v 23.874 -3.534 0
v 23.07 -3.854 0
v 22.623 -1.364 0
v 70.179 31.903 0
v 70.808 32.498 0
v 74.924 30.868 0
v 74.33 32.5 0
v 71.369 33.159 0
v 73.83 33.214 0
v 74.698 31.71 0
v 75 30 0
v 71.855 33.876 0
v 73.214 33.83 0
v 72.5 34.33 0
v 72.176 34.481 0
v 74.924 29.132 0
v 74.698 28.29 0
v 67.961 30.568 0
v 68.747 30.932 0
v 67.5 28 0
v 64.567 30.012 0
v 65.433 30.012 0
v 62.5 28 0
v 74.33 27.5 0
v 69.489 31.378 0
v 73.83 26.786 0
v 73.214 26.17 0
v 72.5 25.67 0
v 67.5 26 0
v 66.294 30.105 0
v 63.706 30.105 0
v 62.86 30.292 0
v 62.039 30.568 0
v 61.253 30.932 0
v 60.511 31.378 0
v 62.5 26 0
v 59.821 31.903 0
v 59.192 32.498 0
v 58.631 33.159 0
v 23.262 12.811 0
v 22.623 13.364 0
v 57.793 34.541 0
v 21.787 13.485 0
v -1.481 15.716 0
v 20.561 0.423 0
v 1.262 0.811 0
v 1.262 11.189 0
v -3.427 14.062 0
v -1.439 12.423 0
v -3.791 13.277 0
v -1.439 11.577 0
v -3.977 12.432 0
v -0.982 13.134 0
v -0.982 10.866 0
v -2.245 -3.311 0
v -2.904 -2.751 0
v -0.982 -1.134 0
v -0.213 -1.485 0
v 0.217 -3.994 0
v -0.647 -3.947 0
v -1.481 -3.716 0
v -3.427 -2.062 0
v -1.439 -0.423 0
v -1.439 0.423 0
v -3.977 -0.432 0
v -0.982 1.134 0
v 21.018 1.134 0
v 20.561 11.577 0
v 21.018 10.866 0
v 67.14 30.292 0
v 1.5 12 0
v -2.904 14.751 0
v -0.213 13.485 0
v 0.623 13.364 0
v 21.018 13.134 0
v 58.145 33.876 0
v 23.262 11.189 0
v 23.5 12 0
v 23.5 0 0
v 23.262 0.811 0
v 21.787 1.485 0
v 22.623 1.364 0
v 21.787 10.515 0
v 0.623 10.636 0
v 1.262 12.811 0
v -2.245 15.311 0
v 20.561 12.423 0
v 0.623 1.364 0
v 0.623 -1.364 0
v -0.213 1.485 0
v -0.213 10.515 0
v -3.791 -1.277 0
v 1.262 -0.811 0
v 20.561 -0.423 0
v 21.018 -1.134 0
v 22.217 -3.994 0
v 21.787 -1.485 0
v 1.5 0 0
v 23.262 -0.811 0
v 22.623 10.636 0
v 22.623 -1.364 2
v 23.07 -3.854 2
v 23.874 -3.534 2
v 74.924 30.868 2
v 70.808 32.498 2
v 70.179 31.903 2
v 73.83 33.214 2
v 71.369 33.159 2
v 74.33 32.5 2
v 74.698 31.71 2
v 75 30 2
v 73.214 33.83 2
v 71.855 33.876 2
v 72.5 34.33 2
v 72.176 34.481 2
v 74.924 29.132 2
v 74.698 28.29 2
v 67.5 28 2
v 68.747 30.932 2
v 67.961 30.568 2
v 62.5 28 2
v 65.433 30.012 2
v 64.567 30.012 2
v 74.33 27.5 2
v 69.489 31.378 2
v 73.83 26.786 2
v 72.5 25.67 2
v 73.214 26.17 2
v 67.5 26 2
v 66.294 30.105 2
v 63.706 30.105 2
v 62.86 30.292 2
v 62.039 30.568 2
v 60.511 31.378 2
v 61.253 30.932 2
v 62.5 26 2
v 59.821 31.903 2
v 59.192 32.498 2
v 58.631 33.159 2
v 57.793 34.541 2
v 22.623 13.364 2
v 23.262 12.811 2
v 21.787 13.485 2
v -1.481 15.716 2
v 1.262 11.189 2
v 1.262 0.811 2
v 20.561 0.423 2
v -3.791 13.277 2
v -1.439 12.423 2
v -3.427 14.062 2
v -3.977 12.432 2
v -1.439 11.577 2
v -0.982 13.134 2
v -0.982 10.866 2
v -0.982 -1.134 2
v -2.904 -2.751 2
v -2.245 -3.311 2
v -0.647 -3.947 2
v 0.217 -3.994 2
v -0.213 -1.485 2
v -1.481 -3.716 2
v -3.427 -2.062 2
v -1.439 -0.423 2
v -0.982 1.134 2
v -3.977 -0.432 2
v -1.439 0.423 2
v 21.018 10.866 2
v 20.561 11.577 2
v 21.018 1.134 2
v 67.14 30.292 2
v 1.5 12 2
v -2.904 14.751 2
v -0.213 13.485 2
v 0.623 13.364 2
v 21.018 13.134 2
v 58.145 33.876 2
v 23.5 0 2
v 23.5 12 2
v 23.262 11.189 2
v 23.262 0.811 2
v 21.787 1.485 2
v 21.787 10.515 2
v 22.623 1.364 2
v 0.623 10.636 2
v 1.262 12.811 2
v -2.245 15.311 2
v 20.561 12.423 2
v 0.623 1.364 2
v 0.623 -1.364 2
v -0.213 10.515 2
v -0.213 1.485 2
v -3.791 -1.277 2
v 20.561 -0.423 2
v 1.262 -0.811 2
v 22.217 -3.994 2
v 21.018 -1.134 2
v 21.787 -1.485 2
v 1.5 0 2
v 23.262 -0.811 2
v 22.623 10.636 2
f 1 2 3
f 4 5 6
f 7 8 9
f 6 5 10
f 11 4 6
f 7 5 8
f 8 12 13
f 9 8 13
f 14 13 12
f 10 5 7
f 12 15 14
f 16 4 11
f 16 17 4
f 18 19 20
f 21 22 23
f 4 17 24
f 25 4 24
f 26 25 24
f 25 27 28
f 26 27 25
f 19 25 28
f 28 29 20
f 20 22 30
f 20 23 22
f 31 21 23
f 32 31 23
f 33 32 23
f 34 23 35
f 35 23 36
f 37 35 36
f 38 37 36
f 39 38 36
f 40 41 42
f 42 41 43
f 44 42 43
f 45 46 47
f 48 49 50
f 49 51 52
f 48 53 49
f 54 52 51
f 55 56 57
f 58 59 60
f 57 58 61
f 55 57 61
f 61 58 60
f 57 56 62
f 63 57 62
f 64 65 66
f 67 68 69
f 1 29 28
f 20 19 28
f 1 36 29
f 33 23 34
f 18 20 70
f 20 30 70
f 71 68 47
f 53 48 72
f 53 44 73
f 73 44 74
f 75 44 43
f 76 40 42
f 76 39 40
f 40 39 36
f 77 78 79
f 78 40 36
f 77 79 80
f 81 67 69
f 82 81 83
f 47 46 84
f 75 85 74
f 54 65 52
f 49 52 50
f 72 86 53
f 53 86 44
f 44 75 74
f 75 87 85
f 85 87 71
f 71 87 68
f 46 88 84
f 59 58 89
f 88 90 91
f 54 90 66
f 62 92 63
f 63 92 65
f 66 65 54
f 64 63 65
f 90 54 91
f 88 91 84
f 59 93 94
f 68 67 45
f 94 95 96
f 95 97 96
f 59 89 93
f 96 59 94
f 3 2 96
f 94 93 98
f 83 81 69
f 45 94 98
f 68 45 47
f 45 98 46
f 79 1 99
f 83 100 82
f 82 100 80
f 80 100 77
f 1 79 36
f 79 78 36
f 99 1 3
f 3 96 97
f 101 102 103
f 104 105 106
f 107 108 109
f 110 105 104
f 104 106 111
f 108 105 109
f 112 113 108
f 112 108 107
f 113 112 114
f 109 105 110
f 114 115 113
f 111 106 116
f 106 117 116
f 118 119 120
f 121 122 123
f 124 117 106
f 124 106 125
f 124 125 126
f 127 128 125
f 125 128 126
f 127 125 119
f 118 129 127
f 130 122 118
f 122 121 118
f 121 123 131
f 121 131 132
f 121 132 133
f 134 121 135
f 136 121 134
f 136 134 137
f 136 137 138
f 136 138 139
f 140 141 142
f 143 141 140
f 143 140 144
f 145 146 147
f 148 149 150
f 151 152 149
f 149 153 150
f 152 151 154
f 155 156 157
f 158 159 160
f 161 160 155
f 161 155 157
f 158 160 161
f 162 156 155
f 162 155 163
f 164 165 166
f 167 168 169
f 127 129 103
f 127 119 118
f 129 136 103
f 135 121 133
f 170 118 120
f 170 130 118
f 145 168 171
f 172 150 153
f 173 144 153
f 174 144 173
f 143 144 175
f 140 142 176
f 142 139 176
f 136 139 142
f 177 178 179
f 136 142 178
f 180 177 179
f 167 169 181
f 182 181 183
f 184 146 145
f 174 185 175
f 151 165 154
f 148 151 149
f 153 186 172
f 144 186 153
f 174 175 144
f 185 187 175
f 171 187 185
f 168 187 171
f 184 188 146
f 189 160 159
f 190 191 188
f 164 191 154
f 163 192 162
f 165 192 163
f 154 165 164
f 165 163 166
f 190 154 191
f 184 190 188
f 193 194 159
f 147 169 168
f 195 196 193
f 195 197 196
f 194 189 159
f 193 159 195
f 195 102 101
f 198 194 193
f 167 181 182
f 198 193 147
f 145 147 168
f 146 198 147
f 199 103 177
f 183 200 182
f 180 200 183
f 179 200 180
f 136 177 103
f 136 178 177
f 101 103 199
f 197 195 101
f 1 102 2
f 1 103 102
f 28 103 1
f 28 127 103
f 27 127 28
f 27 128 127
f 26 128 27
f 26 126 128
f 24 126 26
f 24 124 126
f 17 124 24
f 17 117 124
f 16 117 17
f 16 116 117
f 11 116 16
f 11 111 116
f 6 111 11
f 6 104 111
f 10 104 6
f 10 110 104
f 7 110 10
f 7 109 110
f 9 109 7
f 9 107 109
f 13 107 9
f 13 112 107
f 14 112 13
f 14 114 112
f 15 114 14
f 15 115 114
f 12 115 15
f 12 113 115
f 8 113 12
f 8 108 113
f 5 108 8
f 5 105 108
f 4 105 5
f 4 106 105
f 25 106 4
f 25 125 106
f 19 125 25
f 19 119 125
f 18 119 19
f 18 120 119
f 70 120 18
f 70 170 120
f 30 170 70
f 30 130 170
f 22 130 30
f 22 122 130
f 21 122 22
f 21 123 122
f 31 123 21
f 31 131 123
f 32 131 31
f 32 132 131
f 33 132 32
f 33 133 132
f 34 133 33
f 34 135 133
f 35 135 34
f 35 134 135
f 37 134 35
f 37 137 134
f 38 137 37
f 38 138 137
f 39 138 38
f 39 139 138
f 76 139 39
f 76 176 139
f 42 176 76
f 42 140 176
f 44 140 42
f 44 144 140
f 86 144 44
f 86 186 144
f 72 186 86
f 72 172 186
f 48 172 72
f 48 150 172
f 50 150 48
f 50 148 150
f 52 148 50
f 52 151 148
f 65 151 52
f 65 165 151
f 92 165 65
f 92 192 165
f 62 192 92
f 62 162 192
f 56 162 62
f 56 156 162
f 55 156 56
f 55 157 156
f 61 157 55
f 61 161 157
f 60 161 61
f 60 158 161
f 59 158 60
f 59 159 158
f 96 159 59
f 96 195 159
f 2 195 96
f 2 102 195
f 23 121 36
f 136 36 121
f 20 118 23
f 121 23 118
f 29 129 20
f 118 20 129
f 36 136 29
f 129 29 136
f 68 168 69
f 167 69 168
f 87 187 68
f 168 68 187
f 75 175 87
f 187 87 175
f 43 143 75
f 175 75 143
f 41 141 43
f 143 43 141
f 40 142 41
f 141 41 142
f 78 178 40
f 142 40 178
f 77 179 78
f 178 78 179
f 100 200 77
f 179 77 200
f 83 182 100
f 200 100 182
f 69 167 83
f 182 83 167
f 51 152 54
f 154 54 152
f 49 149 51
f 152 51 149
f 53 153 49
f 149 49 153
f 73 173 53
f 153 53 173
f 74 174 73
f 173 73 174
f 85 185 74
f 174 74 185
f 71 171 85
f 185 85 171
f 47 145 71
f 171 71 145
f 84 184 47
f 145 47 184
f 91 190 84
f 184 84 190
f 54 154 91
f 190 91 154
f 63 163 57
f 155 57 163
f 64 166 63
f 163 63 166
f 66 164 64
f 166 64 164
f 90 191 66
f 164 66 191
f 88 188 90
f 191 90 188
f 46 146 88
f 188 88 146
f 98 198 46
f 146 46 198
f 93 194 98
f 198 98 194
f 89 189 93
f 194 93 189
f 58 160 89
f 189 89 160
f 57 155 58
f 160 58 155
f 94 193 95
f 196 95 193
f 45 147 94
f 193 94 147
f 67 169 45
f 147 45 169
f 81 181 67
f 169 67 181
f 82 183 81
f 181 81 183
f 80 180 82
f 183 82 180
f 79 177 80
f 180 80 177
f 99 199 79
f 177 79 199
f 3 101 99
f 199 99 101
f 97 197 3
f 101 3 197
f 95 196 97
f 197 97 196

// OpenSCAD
$fa = 1;
$fs = 1.75 / 2;

border_radius = 4;

mount_depth = 30;
mount_height = 20;

holder_depth = 20;
holder_height = 10;

holder_distance = 30;
holder_elevation = 10;

branch_holder_radius = 8;
screw_hole_radius = 1.5;

linear_extrude(height = 2)
difference() {
    hull() {
        hull() {
            translate([0, 0])
            circle(r = border_radius);

            translate([mount_depth - border_radius * 2, 0])
            circle(r = border_radius);

            translate([mount_depth - border_radius * 2, mount_height - border_radius * 2])
            circle(r = border_radius);

            translate([0, mount_height - border_radius * 2])
            circle(r = border_radius);
        }

        translate([mount_depth + holder_distance, mount_height + holder_elevation])
        hull() {
            translate([0, 0])
            circle(r = holder_height / 2);

            translate([holder_depth - holder_height, 0])
            circle(r = holder_height / 2);
        }
    }

    circle(r = screw_hole_radius);

    translate([mount_depth - border_radius * 2, 0])
    circle(r = screw_hole_radius);

    translate([mount_depth - border_radius * 2, mount_height - border_radius * 2])
    circle(r = screw_hole_radius);

    translate([0, mount_height - border_radius * 2])
    circle(r = screw_hole_radius);

    translate([
        mount_depth + holder_distance + holder_depth / 2 - holder_height / 2,
        mount_height + holder_elevation + branch_holder_radius
    ])
    union() {
        circle(r = branch_holder_radius);

        translate([-2.5, -branch_holder_radius - 4])
        square([5, 2]);
    }
}
